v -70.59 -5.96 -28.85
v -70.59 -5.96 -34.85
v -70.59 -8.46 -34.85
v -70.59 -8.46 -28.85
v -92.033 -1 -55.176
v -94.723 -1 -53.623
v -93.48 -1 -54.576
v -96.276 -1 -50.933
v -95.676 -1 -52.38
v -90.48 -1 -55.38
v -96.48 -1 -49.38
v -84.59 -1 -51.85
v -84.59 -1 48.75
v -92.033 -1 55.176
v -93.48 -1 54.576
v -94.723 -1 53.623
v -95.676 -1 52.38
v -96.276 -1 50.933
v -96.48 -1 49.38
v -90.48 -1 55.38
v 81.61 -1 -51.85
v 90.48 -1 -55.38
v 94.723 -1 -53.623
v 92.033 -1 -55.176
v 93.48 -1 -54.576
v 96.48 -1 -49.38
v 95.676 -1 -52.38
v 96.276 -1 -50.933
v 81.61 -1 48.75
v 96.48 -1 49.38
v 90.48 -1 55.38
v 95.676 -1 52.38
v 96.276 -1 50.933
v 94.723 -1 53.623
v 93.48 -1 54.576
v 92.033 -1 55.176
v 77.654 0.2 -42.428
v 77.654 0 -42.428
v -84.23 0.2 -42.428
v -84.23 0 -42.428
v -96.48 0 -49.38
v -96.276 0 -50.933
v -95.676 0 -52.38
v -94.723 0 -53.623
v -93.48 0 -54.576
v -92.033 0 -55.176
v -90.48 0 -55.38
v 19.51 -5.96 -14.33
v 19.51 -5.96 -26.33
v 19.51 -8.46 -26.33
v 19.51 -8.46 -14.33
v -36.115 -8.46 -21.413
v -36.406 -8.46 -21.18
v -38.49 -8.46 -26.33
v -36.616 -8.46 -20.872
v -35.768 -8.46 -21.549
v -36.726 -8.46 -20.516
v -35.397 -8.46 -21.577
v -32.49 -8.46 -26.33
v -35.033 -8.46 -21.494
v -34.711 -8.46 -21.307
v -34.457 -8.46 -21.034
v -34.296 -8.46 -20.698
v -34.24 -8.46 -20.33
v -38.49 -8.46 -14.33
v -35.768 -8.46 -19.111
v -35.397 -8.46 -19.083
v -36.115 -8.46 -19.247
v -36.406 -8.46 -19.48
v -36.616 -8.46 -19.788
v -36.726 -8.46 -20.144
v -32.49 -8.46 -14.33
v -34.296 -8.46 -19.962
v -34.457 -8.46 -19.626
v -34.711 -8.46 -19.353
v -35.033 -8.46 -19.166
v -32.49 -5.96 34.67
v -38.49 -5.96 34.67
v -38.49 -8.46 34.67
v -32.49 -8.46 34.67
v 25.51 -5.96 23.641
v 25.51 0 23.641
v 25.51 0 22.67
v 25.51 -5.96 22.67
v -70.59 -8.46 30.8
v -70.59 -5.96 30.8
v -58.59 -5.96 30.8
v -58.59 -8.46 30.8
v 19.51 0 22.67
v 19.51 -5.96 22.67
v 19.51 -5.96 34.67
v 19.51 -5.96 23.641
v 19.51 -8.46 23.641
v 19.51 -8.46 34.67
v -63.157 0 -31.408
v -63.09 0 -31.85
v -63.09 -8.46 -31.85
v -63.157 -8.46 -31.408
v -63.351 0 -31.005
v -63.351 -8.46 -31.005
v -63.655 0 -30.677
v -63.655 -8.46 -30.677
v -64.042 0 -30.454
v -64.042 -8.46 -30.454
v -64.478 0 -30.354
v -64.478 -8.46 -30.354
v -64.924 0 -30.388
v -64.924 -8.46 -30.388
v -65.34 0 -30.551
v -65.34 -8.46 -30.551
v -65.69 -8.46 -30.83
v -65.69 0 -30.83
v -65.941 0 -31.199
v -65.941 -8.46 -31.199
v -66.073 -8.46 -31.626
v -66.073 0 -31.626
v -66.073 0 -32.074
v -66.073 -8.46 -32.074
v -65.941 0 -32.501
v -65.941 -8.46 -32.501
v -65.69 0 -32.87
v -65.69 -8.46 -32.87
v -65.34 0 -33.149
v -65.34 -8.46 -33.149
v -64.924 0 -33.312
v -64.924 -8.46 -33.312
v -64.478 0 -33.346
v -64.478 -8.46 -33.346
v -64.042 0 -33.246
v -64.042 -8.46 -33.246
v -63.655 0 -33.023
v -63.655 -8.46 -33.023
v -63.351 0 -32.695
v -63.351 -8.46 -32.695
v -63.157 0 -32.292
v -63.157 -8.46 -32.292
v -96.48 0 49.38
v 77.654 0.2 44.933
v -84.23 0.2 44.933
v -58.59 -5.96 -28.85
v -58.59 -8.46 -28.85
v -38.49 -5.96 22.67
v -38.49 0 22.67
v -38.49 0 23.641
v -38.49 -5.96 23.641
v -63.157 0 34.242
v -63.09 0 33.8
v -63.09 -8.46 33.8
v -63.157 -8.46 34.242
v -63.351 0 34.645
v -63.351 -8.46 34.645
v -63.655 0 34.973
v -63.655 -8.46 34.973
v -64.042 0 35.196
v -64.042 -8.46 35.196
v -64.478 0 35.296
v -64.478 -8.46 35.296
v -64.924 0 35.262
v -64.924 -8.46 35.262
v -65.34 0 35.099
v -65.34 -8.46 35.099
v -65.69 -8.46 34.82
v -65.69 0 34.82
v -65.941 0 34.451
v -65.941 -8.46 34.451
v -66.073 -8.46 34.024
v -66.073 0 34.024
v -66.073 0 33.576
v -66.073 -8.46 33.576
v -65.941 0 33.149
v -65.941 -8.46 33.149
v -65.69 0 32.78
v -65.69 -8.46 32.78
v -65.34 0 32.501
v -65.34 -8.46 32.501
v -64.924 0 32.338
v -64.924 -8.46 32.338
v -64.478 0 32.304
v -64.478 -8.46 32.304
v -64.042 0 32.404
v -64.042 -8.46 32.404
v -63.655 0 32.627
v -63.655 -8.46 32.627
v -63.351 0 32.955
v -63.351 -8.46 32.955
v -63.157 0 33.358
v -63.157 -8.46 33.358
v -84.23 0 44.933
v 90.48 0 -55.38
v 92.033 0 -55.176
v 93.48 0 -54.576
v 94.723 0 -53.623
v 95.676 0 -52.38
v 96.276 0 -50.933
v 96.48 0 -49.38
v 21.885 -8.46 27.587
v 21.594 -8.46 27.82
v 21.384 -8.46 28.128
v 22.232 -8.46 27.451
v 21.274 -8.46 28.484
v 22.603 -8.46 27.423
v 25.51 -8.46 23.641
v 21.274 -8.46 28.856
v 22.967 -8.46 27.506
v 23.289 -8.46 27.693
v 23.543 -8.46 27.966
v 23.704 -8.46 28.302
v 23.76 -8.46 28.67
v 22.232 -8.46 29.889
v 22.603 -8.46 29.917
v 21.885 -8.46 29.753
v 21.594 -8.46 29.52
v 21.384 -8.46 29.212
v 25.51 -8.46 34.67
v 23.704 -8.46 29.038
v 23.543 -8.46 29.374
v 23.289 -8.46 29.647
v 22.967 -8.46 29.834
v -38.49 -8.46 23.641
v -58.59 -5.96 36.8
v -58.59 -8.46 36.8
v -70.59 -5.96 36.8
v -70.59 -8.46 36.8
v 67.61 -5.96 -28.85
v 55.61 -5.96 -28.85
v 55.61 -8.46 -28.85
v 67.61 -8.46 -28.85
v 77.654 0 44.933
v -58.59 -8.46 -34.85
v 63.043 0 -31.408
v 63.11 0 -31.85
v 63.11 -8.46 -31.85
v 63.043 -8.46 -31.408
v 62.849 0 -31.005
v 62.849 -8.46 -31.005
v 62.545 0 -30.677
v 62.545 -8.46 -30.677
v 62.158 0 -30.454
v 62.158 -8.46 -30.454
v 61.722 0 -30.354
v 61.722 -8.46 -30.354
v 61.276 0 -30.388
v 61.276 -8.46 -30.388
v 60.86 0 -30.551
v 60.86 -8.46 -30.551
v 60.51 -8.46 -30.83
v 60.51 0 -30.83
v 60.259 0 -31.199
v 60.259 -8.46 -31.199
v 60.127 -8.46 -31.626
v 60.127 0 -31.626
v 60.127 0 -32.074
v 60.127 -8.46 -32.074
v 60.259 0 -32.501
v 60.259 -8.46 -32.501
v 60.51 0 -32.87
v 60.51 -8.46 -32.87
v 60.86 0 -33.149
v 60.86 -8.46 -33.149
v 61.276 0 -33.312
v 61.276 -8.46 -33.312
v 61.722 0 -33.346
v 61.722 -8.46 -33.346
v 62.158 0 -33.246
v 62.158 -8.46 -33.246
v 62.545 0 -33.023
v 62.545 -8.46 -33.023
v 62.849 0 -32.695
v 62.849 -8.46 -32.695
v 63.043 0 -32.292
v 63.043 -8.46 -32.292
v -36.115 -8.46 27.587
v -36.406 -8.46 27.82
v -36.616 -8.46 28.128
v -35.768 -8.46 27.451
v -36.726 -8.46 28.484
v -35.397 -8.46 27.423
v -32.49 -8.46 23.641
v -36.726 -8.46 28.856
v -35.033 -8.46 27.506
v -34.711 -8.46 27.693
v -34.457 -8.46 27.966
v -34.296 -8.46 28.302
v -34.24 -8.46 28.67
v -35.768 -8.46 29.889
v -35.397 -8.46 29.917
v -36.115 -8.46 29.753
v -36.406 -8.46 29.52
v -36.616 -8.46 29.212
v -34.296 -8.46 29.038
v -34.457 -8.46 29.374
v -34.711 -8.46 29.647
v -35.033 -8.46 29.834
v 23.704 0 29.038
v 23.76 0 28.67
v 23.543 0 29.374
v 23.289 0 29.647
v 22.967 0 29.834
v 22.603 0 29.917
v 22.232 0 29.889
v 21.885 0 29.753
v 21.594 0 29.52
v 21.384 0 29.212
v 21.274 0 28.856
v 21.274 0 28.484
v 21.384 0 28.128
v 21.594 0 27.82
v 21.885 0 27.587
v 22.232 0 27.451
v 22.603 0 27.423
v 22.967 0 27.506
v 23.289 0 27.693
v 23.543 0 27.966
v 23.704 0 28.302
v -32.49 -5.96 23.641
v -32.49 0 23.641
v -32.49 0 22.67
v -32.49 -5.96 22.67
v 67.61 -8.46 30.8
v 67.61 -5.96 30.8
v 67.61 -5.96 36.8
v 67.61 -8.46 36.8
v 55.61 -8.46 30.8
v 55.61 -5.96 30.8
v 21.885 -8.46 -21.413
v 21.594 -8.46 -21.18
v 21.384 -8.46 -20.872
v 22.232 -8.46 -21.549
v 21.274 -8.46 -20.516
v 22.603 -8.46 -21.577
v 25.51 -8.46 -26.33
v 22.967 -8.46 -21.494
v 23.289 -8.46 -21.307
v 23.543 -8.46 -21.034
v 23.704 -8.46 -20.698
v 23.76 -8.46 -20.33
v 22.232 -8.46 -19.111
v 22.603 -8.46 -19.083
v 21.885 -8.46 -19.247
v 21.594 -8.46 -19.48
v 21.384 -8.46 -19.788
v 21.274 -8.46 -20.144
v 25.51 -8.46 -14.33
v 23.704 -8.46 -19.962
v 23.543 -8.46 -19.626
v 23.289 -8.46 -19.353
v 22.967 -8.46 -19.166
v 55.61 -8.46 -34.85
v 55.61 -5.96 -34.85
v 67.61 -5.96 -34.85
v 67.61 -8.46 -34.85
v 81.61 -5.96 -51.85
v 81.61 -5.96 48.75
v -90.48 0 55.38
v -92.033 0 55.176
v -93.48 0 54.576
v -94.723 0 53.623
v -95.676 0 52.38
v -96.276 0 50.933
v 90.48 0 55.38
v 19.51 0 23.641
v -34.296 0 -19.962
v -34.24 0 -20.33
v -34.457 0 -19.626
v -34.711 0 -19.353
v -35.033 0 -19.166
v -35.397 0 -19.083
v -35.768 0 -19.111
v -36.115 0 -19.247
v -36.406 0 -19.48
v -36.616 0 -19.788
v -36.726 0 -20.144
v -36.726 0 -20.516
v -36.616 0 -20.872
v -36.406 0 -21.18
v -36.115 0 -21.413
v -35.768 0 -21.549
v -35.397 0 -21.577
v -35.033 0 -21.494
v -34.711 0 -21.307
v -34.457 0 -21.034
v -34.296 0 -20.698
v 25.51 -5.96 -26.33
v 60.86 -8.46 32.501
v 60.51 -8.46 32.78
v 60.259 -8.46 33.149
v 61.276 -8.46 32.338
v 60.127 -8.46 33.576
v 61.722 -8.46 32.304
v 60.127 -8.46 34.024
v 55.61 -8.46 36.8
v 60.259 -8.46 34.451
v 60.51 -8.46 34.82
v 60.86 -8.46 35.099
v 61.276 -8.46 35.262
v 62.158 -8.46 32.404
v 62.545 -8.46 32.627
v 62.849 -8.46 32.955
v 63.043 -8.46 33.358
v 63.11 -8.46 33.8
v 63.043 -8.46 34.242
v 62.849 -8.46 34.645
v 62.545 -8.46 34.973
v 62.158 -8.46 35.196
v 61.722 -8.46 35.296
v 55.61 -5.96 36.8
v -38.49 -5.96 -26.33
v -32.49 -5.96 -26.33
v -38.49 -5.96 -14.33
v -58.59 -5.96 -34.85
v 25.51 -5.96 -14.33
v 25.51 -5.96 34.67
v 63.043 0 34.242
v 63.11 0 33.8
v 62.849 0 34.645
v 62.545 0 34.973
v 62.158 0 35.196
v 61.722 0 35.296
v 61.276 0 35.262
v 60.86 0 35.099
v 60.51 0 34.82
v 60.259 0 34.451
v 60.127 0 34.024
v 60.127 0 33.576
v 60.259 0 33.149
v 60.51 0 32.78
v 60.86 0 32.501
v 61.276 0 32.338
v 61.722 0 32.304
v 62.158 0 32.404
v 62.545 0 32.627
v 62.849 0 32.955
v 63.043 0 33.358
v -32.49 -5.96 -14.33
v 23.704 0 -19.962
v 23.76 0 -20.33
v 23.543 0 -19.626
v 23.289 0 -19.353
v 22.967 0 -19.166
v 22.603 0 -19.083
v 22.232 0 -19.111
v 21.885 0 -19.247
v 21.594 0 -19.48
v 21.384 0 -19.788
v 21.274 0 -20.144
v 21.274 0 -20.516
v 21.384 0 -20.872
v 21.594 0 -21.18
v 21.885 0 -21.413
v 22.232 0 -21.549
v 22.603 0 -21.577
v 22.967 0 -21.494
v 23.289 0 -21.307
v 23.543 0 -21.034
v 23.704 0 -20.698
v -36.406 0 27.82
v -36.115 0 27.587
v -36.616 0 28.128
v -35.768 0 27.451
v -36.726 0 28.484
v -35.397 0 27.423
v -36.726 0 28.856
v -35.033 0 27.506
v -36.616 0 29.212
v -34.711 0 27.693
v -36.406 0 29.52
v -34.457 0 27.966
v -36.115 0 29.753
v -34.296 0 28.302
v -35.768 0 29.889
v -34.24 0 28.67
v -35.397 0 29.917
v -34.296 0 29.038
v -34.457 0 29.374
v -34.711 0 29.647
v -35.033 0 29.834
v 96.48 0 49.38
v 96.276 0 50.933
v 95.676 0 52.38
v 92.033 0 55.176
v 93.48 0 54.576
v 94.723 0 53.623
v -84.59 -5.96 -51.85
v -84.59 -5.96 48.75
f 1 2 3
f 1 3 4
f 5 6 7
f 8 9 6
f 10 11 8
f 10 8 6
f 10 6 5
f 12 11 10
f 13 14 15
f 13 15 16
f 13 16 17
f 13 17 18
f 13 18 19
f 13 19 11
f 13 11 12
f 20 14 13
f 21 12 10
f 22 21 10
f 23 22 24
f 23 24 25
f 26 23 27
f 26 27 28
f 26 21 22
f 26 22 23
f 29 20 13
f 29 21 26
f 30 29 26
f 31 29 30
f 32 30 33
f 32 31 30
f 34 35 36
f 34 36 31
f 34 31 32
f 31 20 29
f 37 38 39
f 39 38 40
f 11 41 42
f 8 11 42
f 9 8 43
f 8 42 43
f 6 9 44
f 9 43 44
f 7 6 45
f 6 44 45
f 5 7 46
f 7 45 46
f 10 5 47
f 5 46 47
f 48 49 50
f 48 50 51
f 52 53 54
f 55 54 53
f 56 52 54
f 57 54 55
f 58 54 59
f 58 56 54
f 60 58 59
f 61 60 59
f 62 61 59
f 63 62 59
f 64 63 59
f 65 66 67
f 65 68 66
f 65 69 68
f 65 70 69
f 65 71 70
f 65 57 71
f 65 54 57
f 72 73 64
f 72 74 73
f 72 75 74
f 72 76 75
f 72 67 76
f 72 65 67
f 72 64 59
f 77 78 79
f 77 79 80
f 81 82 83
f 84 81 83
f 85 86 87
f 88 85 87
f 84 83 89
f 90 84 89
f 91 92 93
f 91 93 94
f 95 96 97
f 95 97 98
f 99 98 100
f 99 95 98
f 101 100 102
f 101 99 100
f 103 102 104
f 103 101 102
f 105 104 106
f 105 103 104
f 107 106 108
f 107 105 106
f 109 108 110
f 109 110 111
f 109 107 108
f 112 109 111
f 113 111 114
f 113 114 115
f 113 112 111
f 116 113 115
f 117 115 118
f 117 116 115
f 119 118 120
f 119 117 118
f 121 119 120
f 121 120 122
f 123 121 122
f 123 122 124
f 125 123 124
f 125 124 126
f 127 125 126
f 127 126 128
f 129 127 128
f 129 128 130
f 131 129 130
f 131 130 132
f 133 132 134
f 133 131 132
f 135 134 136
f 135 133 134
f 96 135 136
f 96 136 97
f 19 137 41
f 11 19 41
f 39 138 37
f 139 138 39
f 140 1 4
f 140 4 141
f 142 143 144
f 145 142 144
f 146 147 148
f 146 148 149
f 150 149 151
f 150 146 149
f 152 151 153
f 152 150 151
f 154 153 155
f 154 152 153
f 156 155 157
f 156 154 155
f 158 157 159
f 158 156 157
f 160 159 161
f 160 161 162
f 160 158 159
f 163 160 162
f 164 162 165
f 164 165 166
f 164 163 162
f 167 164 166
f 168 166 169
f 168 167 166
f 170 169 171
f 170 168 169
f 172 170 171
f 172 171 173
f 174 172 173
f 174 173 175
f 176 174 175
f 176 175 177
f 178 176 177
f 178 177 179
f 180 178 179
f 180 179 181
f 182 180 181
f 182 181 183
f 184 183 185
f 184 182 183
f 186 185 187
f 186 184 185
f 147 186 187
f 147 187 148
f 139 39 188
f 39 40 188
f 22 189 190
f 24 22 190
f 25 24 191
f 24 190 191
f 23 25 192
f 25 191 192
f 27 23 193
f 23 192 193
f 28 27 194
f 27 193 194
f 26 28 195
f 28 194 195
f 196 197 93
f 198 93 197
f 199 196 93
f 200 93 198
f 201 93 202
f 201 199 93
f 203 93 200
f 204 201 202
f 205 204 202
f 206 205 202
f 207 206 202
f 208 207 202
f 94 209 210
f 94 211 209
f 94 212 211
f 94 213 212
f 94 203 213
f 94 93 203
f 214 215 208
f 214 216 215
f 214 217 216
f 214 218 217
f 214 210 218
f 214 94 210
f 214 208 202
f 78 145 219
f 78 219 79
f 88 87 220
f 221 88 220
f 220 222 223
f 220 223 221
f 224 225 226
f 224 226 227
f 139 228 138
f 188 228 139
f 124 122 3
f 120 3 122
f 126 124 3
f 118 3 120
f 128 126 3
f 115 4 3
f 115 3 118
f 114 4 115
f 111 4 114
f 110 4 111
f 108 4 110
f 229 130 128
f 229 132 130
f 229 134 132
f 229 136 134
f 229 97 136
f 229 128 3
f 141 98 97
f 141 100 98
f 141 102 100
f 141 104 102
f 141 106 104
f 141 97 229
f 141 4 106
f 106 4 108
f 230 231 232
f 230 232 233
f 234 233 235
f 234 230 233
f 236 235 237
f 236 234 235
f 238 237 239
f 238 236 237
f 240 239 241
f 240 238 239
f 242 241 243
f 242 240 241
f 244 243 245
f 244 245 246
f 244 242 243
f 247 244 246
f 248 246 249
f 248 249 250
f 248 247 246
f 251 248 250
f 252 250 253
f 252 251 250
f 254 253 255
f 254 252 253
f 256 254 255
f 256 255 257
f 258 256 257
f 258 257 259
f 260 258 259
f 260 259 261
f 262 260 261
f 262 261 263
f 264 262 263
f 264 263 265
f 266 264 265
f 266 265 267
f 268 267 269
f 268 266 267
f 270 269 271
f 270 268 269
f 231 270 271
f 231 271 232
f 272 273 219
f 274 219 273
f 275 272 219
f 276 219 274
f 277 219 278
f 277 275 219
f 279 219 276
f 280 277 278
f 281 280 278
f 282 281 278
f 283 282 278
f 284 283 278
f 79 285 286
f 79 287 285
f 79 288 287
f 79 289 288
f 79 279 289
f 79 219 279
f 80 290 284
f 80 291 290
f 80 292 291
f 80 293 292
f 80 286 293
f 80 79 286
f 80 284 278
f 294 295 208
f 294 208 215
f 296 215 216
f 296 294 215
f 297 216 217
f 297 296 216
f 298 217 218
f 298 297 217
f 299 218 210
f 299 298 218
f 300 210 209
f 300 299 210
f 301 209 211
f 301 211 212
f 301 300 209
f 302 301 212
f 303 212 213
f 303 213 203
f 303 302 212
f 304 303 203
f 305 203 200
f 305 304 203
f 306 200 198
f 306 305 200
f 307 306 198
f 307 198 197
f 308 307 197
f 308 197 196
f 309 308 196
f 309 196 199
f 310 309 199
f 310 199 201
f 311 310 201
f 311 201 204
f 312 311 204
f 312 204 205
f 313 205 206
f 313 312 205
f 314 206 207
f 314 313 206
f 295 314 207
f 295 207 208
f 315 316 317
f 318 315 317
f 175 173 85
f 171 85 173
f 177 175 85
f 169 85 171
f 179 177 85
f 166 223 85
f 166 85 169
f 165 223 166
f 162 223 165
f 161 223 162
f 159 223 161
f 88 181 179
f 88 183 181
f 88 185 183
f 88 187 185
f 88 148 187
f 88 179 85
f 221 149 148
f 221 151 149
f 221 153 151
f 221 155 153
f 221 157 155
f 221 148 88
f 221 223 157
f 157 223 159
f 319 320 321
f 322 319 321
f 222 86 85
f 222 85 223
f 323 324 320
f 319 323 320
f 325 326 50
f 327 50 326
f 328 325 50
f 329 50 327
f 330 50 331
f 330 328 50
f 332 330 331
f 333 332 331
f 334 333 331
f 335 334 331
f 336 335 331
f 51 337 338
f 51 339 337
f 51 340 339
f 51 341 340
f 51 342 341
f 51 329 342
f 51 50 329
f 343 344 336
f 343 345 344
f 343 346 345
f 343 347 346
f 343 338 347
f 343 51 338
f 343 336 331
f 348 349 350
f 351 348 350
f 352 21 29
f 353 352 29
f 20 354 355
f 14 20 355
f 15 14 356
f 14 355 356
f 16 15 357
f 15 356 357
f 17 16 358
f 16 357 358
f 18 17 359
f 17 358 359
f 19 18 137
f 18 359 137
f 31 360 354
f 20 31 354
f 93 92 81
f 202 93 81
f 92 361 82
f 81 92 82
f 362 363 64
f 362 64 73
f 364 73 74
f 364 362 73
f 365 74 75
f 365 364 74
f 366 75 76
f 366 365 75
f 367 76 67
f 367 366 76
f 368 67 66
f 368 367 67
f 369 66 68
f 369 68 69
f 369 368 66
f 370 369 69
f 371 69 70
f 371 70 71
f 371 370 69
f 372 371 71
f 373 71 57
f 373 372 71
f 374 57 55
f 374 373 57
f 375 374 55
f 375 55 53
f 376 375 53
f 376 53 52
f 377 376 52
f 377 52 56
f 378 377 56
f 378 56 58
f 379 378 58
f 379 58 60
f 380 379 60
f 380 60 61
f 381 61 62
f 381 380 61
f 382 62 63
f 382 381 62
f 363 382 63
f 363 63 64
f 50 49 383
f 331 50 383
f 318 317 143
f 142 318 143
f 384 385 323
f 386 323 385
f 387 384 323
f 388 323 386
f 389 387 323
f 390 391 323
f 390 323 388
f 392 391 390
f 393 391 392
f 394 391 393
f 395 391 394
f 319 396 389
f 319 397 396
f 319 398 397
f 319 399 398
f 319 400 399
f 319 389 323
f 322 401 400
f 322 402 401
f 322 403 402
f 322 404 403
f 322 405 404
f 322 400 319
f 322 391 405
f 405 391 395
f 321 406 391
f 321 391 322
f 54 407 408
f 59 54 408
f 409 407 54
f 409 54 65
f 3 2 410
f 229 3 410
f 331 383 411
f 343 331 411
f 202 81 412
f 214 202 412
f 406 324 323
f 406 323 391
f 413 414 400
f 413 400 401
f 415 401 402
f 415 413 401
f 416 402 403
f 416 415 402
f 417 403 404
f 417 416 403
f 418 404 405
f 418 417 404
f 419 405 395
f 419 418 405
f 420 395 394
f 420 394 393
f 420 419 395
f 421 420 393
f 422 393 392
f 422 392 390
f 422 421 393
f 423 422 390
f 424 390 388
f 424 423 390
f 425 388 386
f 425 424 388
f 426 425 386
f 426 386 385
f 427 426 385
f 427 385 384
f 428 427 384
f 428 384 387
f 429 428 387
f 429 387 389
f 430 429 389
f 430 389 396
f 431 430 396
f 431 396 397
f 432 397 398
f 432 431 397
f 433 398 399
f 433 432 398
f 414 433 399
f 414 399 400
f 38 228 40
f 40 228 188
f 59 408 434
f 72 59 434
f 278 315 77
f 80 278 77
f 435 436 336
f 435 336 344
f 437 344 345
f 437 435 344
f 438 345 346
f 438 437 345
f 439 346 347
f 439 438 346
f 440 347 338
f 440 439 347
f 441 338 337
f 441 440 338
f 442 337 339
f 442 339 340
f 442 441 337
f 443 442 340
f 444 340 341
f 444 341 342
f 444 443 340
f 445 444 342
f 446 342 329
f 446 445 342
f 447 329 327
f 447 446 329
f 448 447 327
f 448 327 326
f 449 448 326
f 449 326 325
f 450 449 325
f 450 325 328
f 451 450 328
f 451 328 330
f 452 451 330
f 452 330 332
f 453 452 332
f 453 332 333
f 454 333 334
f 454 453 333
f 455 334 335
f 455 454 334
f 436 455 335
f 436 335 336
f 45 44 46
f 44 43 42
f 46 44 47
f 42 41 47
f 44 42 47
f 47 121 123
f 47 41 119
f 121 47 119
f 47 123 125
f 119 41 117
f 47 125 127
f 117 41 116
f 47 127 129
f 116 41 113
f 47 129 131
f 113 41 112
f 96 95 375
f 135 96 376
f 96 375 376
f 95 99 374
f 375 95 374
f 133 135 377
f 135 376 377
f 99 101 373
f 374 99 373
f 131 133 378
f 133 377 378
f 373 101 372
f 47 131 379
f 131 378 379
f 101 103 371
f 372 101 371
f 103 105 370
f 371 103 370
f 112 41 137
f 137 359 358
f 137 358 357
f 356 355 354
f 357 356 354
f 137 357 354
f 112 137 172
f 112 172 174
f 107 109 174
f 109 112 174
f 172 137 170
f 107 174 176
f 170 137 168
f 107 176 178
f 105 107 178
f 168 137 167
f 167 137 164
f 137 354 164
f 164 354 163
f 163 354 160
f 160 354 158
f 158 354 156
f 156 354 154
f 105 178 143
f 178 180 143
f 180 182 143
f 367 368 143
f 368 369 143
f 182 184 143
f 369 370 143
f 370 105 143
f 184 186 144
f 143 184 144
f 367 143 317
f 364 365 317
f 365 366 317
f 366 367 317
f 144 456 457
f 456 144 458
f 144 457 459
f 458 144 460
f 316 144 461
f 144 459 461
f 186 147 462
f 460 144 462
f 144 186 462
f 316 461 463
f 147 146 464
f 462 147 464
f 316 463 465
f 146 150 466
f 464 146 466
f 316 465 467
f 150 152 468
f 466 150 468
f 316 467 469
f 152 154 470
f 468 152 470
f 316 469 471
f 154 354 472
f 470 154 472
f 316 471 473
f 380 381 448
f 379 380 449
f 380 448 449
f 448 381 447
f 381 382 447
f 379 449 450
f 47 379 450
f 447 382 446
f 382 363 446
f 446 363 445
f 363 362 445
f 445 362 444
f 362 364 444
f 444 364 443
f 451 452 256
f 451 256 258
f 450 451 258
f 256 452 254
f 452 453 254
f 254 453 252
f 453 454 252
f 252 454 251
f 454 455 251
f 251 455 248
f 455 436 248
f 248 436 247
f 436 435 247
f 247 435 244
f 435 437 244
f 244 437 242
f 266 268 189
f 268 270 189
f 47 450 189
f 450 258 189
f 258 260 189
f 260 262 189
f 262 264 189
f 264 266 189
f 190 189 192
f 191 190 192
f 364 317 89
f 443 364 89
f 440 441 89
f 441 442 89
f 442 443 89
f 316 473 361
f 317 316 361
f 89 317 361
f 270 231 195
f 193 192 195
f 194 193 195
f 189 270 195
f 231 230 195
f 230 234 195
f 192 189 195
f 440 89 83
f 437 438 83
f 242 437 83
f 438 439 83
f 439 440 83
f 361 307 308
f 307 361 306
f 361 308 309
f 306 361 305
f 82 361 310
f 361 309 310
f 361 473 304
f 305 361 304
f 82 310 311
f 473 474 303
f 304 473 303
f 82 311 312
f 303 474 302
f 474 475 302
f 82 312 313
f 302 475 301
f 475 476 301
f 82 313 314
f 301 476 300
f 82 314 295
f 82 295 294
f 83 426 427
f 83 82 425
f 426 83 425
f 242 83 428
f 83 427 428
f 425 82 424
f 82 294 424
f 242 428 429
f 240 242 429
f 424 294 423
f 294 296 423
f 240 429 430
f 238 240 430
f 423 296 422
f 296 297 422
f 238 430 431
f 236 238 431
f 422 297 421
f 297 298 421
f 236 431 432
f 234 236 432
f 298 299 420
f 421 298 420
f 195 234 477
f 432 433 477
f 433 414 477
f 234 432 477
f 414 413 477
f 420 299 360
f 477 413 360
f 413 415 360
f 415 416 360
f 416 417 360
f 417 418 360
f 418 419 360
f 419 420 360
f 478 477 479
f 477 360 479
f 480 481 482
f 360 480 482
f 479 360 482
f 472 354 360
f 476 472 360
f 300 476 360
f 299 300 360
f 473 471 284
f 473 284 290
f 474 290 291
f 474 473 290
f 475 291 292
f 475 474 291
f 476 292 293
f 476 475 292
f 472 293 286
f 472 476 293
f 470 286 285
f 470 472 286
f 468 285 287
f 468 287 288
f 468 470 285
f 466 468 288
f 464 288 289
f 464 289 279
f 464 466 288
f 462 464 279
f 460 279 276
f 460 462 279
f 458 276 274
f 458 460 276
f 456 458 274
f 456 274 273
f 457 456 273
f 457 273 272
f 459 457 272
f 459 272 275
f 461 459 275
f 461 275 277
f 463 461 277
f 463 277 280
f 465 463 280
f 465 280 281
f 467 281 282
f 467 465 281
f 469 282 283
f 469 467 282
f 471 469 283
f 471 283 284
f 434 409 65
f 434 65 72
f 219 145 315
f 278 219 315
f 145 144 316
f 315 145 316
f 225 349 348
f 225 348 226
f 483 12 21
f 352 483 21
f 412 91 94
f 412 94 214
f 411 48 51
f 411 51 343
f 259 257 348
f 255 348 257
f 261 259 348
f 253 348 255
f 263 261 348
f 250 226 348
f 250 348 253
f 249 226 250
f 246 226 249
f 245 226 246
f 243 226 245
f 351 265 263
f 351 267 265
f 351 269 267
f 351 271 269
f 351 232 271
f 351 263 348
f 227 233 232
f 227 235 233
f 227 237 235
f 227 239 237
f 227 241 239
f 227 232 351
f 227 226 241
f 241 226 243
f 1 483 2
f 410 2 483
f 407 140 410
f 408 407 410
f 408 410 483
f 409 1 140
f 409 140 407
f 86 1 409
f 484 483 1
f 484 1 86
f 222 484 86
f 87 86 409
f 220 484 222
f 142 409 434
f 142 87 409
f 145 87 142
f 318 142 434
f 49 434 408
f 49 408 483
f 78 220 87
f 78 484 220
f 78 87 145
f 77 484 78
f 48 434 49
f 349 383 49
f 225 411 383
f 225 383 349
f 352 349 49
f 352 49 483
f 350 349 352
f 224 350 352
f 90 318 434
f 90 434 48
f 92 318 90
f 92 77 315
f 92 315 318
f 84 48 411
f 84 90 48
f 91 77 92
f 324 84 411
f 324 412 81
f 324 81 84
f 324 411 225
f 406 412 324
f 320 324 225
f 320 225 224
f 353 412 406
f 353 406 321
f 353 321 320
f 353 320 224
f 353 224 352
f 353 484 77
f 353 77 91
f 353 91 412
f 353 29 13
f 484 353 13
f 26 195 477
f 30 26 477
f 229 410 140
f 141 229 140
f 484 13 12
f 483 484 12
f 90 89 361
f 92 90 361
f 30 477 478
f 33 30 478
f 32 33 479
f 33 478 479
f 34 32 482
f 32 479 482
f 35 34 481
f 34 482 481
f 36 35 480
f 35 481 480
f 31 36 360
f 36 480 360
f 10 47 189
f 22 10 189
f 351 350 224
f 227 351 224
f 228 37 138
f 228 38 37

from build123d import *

# Parameters (mm, degrees)
F0_W     = 12
F0_H     = 6
F0_W_2   = 6
F0_H_2   = 12
F1_DEPTH = 5.96
F0_R     = 1.5
F0_H_3   = 11.0293431562
F0_R_2   = 1.25
F2_DEPTH = 8.46
F3_DEPTH = 1
F6_W     = 161.8837043643
F6_H     = 87.3608402908
F7_DEPTH = 0.1
F8_W     = 161.8837043643
F8_H     = 87.3608402908
F9_DEPTH = 0.1


with BuildPart() as f1:
    # F0 (on Front) → F1 (new body)
    with BuildSketch(Plane.XZ):
        Polygon((81.61, 48.75), (76.401591301, 48.75), (55.0863295794, 48.75), (55.0863295794, 28.67), (55.0863295794, 23.6406568438), (25.51, 23.6406568438), (25.51, 22.67), (19.51, 22.67), (19.51, 23.6406568438), (9.3936370686, 23.6406568438), (-32.49, 23.6406568438), (-32.49, 22.67), (-38.49, 22.67), (-38.49, 23.6406568438), (-64.59, 23.6406568438), (-84.59, 23.6406568438), (-84.59, 7.6714716852), (-84.59, -51.85), (81.61, -51.85), align=None)
        with Locations((-64.59, -31.85)):
            Rectangle(F0_W, F0_H, mode=Mode.SUBTRACT)
        with Locations((-35.49, -20.33)):
            Rectangle(F0_W_2, F0_H_2, mode=Mode.SUBTRACT)
        with Locations((61.61, -31.85)):
            Rectangle(F0_W, F0_H, mode=Mode.SUBTRACT)
        with Locations((22.51, -20.33)):
            Rectangle(F0_W_2, F0_H_2, mode=Mode.SUBTRACT)
        with Locations((61.61, 33.8)):
            Rectangle(F0_W, F0_H, mode=Mode.SUBTRACT)
        Polygon((55.0863295794, 48.75), (-83.4645852447, 48.75), (-84.59, 48.75), (-84.59, 39.8336872458), (-84.59, 23.6406568438), (-64.59, 23.6406568438), (-38.49, 23.6406568438), (-38.49, 34.67), (-32.49, 34.67), (-32.49, 23.6406568438), (9.3936370686, 23.6406568438), (19.51, 23.6406568438), (19.51, 34.67), (25.51, 34.67), (25.51, 23.6406568438), (55.0863295794, 23.6406568438), (55.0863295794, 28.67), align=None)
        with Locations((-64.59, 33.8)):
            Rectangle(F0_W, F0_H, mode=Mode.SUBTRACT)
    extrude(amount=F1_DEPTH)

    # F0 (on Front) → F2 (join)
    with BuildSketch(Plane.XZ):
        with Locations((-64.59, 33.8)):
            Rectangle(F0_W, F0_H)
        with Locations((-64.59, 33.8)):
            Circle(F0_R, mode=Mode.SUBTRACT)
        with Locations((-35.49, 29.1553284219)):
            Rectangle(F0_W_2, F0_H_3)
        with Locations((-35.49, 28.67)):
            Circle(F0_R_2, mode=Mode.SUBTRACT)
        with Locations((22.51, 29.1553284219)):
            Rectangle(F0_W_2, F0_H_3)
        with Locations((22.51, 28.67)):
            Circle(F0_R_2, mode=Mode.SUBTRACT)
        with Locations((61.61, 33.8)):
            Rectangle(F0_W, F0_H)
        with Locations((61.61, 33.8)):
            Circle(F0_R, mode=Mode.SUBTRACT)
        with Locations((22.51, -20.33)):
            Rectangle(F0_W_2, F0_H_2)
        with Locations((22.51, -20.33)):
            Circle(F0_R_2, mode=Mode.SUBTRACT)
        with Locations((61.61, -31.85)):
            Rectangle(F0_W, F0_H)
        with Locations((61.61, -31.85)):
            Circle(F0_R, mode=Mode.SUBTRACT)
        with Locations((-35.49, -20.33)):
            Rectangle(F0_W_2, F0_H_2)
        with Locations((-35.49, -20.33)):
            Circle(F0_R_2, mode=Mode.SUBTRACT)
        with Locations((-64.59, -31.85)):
            Rectangle(F0_W, F0_H)
        with Locations((-64.59, -31.85)):
            Circle(F0_R, mode=Mode.SUBTRACT)
    extrude(amount=F2_DEPTH)

    # F0 (on Front) → F3 (join)
    with BuildSketch(Plane.XZ):
        with BuildLine():
            ThreePointArc((96.48, 49.38), (94.7226406871, 53.6226406871), (90.48, 55.38))
            Line((90.48, 55.38), (76.401591301, 55.38))
            Line((76.401591301, 55.38), (76.401591301, 48.75))
            Line((76.401591301, 48.75), (81.61, 48.75))
            Line((81.61, 48.75), (81.61, -51.85))
            Line((81.61, -51.85), (-84.59, -51.85))
            Line((-84.59, -51.85), (-84.59, 7.6714716852))
            Line((-84.59, 7.6714716852), (-84.59, 23.6406568438))
            Line((-84.59, 23.6406568438), (-84.59, 39.8336872458))
            Line((-84.59, 39.8336872458), (-96.48, 39.8336872458))
            Line((-96.48, 39.8336872458), (-96.48, -49.38))
            ThreePointArc((-96.48, -49.38), (-94.7226406871, -53.6226406871), (-90.48, -55.38))
            Line((-90.48, -55.38), (90.48, -55.38))
            ThreePointArc((90.48, -55.38), (94.7226406871, -53.6226406871), (96.48, -49.38))
            Line((96.48, -49.38), (96.48, 49.38))
        make_face()
        with BuildLine():
            Line((-83.4645852447, 48.75), (-83.4645852447, 55.38))
            Line((-83.4645852447, 55.38), (-90.48, 55.38))
            ThreePointArc((-90.48, 55.38), (-94.7226406871, 53.6226406871), (-96.48, 49.38))
            Line((-96.48, 49.38), (-96.48, 39.8336872458))
            Line((-96.48, 39.8336872458), (-84.59, 39.8336872458))
            Line((-84.59, 39.8336872458), (-84.59, 48.75))
            Line((-84.59, 48.75), (-83.4645852447, 48.75))
        make_face()
        Polygon((76.401591301, 48.75), (76.401591301, 55.38), (-83.4645852447, 55.38), (-83.4645852447, 48.75), (55.0863295794, 48.75), align=None)
    extrude(amount=F3_DEPTH)


with BuildPart() as f7:
    # F6 (on offset) → F7 (new body)
    with BuildSketch(Plane(origin=(0, 0, 0), x_dir=(-1, 0, 0), z_dir=(0, 1, 0))):
        with Locations((3.2877735794, 1.2524854392)):
            Rectangle(F6_W, F6_H)
    extrude(amount=F7_DEPTH)

    # F8 (on face) → F9 (join)
    with BuildSketch(Plane(origin=(0, 0.1, 0), x_dir=(-1, 0, 0), z_dir=(0, 1, 0))):
        with Locations((3.2877735794, 1.2524854392)):
            Rectangle(F8_W, F8_H)
    extrude(amount=F9_DEPTH)


solid = Compound([f1.part, f7.part])
